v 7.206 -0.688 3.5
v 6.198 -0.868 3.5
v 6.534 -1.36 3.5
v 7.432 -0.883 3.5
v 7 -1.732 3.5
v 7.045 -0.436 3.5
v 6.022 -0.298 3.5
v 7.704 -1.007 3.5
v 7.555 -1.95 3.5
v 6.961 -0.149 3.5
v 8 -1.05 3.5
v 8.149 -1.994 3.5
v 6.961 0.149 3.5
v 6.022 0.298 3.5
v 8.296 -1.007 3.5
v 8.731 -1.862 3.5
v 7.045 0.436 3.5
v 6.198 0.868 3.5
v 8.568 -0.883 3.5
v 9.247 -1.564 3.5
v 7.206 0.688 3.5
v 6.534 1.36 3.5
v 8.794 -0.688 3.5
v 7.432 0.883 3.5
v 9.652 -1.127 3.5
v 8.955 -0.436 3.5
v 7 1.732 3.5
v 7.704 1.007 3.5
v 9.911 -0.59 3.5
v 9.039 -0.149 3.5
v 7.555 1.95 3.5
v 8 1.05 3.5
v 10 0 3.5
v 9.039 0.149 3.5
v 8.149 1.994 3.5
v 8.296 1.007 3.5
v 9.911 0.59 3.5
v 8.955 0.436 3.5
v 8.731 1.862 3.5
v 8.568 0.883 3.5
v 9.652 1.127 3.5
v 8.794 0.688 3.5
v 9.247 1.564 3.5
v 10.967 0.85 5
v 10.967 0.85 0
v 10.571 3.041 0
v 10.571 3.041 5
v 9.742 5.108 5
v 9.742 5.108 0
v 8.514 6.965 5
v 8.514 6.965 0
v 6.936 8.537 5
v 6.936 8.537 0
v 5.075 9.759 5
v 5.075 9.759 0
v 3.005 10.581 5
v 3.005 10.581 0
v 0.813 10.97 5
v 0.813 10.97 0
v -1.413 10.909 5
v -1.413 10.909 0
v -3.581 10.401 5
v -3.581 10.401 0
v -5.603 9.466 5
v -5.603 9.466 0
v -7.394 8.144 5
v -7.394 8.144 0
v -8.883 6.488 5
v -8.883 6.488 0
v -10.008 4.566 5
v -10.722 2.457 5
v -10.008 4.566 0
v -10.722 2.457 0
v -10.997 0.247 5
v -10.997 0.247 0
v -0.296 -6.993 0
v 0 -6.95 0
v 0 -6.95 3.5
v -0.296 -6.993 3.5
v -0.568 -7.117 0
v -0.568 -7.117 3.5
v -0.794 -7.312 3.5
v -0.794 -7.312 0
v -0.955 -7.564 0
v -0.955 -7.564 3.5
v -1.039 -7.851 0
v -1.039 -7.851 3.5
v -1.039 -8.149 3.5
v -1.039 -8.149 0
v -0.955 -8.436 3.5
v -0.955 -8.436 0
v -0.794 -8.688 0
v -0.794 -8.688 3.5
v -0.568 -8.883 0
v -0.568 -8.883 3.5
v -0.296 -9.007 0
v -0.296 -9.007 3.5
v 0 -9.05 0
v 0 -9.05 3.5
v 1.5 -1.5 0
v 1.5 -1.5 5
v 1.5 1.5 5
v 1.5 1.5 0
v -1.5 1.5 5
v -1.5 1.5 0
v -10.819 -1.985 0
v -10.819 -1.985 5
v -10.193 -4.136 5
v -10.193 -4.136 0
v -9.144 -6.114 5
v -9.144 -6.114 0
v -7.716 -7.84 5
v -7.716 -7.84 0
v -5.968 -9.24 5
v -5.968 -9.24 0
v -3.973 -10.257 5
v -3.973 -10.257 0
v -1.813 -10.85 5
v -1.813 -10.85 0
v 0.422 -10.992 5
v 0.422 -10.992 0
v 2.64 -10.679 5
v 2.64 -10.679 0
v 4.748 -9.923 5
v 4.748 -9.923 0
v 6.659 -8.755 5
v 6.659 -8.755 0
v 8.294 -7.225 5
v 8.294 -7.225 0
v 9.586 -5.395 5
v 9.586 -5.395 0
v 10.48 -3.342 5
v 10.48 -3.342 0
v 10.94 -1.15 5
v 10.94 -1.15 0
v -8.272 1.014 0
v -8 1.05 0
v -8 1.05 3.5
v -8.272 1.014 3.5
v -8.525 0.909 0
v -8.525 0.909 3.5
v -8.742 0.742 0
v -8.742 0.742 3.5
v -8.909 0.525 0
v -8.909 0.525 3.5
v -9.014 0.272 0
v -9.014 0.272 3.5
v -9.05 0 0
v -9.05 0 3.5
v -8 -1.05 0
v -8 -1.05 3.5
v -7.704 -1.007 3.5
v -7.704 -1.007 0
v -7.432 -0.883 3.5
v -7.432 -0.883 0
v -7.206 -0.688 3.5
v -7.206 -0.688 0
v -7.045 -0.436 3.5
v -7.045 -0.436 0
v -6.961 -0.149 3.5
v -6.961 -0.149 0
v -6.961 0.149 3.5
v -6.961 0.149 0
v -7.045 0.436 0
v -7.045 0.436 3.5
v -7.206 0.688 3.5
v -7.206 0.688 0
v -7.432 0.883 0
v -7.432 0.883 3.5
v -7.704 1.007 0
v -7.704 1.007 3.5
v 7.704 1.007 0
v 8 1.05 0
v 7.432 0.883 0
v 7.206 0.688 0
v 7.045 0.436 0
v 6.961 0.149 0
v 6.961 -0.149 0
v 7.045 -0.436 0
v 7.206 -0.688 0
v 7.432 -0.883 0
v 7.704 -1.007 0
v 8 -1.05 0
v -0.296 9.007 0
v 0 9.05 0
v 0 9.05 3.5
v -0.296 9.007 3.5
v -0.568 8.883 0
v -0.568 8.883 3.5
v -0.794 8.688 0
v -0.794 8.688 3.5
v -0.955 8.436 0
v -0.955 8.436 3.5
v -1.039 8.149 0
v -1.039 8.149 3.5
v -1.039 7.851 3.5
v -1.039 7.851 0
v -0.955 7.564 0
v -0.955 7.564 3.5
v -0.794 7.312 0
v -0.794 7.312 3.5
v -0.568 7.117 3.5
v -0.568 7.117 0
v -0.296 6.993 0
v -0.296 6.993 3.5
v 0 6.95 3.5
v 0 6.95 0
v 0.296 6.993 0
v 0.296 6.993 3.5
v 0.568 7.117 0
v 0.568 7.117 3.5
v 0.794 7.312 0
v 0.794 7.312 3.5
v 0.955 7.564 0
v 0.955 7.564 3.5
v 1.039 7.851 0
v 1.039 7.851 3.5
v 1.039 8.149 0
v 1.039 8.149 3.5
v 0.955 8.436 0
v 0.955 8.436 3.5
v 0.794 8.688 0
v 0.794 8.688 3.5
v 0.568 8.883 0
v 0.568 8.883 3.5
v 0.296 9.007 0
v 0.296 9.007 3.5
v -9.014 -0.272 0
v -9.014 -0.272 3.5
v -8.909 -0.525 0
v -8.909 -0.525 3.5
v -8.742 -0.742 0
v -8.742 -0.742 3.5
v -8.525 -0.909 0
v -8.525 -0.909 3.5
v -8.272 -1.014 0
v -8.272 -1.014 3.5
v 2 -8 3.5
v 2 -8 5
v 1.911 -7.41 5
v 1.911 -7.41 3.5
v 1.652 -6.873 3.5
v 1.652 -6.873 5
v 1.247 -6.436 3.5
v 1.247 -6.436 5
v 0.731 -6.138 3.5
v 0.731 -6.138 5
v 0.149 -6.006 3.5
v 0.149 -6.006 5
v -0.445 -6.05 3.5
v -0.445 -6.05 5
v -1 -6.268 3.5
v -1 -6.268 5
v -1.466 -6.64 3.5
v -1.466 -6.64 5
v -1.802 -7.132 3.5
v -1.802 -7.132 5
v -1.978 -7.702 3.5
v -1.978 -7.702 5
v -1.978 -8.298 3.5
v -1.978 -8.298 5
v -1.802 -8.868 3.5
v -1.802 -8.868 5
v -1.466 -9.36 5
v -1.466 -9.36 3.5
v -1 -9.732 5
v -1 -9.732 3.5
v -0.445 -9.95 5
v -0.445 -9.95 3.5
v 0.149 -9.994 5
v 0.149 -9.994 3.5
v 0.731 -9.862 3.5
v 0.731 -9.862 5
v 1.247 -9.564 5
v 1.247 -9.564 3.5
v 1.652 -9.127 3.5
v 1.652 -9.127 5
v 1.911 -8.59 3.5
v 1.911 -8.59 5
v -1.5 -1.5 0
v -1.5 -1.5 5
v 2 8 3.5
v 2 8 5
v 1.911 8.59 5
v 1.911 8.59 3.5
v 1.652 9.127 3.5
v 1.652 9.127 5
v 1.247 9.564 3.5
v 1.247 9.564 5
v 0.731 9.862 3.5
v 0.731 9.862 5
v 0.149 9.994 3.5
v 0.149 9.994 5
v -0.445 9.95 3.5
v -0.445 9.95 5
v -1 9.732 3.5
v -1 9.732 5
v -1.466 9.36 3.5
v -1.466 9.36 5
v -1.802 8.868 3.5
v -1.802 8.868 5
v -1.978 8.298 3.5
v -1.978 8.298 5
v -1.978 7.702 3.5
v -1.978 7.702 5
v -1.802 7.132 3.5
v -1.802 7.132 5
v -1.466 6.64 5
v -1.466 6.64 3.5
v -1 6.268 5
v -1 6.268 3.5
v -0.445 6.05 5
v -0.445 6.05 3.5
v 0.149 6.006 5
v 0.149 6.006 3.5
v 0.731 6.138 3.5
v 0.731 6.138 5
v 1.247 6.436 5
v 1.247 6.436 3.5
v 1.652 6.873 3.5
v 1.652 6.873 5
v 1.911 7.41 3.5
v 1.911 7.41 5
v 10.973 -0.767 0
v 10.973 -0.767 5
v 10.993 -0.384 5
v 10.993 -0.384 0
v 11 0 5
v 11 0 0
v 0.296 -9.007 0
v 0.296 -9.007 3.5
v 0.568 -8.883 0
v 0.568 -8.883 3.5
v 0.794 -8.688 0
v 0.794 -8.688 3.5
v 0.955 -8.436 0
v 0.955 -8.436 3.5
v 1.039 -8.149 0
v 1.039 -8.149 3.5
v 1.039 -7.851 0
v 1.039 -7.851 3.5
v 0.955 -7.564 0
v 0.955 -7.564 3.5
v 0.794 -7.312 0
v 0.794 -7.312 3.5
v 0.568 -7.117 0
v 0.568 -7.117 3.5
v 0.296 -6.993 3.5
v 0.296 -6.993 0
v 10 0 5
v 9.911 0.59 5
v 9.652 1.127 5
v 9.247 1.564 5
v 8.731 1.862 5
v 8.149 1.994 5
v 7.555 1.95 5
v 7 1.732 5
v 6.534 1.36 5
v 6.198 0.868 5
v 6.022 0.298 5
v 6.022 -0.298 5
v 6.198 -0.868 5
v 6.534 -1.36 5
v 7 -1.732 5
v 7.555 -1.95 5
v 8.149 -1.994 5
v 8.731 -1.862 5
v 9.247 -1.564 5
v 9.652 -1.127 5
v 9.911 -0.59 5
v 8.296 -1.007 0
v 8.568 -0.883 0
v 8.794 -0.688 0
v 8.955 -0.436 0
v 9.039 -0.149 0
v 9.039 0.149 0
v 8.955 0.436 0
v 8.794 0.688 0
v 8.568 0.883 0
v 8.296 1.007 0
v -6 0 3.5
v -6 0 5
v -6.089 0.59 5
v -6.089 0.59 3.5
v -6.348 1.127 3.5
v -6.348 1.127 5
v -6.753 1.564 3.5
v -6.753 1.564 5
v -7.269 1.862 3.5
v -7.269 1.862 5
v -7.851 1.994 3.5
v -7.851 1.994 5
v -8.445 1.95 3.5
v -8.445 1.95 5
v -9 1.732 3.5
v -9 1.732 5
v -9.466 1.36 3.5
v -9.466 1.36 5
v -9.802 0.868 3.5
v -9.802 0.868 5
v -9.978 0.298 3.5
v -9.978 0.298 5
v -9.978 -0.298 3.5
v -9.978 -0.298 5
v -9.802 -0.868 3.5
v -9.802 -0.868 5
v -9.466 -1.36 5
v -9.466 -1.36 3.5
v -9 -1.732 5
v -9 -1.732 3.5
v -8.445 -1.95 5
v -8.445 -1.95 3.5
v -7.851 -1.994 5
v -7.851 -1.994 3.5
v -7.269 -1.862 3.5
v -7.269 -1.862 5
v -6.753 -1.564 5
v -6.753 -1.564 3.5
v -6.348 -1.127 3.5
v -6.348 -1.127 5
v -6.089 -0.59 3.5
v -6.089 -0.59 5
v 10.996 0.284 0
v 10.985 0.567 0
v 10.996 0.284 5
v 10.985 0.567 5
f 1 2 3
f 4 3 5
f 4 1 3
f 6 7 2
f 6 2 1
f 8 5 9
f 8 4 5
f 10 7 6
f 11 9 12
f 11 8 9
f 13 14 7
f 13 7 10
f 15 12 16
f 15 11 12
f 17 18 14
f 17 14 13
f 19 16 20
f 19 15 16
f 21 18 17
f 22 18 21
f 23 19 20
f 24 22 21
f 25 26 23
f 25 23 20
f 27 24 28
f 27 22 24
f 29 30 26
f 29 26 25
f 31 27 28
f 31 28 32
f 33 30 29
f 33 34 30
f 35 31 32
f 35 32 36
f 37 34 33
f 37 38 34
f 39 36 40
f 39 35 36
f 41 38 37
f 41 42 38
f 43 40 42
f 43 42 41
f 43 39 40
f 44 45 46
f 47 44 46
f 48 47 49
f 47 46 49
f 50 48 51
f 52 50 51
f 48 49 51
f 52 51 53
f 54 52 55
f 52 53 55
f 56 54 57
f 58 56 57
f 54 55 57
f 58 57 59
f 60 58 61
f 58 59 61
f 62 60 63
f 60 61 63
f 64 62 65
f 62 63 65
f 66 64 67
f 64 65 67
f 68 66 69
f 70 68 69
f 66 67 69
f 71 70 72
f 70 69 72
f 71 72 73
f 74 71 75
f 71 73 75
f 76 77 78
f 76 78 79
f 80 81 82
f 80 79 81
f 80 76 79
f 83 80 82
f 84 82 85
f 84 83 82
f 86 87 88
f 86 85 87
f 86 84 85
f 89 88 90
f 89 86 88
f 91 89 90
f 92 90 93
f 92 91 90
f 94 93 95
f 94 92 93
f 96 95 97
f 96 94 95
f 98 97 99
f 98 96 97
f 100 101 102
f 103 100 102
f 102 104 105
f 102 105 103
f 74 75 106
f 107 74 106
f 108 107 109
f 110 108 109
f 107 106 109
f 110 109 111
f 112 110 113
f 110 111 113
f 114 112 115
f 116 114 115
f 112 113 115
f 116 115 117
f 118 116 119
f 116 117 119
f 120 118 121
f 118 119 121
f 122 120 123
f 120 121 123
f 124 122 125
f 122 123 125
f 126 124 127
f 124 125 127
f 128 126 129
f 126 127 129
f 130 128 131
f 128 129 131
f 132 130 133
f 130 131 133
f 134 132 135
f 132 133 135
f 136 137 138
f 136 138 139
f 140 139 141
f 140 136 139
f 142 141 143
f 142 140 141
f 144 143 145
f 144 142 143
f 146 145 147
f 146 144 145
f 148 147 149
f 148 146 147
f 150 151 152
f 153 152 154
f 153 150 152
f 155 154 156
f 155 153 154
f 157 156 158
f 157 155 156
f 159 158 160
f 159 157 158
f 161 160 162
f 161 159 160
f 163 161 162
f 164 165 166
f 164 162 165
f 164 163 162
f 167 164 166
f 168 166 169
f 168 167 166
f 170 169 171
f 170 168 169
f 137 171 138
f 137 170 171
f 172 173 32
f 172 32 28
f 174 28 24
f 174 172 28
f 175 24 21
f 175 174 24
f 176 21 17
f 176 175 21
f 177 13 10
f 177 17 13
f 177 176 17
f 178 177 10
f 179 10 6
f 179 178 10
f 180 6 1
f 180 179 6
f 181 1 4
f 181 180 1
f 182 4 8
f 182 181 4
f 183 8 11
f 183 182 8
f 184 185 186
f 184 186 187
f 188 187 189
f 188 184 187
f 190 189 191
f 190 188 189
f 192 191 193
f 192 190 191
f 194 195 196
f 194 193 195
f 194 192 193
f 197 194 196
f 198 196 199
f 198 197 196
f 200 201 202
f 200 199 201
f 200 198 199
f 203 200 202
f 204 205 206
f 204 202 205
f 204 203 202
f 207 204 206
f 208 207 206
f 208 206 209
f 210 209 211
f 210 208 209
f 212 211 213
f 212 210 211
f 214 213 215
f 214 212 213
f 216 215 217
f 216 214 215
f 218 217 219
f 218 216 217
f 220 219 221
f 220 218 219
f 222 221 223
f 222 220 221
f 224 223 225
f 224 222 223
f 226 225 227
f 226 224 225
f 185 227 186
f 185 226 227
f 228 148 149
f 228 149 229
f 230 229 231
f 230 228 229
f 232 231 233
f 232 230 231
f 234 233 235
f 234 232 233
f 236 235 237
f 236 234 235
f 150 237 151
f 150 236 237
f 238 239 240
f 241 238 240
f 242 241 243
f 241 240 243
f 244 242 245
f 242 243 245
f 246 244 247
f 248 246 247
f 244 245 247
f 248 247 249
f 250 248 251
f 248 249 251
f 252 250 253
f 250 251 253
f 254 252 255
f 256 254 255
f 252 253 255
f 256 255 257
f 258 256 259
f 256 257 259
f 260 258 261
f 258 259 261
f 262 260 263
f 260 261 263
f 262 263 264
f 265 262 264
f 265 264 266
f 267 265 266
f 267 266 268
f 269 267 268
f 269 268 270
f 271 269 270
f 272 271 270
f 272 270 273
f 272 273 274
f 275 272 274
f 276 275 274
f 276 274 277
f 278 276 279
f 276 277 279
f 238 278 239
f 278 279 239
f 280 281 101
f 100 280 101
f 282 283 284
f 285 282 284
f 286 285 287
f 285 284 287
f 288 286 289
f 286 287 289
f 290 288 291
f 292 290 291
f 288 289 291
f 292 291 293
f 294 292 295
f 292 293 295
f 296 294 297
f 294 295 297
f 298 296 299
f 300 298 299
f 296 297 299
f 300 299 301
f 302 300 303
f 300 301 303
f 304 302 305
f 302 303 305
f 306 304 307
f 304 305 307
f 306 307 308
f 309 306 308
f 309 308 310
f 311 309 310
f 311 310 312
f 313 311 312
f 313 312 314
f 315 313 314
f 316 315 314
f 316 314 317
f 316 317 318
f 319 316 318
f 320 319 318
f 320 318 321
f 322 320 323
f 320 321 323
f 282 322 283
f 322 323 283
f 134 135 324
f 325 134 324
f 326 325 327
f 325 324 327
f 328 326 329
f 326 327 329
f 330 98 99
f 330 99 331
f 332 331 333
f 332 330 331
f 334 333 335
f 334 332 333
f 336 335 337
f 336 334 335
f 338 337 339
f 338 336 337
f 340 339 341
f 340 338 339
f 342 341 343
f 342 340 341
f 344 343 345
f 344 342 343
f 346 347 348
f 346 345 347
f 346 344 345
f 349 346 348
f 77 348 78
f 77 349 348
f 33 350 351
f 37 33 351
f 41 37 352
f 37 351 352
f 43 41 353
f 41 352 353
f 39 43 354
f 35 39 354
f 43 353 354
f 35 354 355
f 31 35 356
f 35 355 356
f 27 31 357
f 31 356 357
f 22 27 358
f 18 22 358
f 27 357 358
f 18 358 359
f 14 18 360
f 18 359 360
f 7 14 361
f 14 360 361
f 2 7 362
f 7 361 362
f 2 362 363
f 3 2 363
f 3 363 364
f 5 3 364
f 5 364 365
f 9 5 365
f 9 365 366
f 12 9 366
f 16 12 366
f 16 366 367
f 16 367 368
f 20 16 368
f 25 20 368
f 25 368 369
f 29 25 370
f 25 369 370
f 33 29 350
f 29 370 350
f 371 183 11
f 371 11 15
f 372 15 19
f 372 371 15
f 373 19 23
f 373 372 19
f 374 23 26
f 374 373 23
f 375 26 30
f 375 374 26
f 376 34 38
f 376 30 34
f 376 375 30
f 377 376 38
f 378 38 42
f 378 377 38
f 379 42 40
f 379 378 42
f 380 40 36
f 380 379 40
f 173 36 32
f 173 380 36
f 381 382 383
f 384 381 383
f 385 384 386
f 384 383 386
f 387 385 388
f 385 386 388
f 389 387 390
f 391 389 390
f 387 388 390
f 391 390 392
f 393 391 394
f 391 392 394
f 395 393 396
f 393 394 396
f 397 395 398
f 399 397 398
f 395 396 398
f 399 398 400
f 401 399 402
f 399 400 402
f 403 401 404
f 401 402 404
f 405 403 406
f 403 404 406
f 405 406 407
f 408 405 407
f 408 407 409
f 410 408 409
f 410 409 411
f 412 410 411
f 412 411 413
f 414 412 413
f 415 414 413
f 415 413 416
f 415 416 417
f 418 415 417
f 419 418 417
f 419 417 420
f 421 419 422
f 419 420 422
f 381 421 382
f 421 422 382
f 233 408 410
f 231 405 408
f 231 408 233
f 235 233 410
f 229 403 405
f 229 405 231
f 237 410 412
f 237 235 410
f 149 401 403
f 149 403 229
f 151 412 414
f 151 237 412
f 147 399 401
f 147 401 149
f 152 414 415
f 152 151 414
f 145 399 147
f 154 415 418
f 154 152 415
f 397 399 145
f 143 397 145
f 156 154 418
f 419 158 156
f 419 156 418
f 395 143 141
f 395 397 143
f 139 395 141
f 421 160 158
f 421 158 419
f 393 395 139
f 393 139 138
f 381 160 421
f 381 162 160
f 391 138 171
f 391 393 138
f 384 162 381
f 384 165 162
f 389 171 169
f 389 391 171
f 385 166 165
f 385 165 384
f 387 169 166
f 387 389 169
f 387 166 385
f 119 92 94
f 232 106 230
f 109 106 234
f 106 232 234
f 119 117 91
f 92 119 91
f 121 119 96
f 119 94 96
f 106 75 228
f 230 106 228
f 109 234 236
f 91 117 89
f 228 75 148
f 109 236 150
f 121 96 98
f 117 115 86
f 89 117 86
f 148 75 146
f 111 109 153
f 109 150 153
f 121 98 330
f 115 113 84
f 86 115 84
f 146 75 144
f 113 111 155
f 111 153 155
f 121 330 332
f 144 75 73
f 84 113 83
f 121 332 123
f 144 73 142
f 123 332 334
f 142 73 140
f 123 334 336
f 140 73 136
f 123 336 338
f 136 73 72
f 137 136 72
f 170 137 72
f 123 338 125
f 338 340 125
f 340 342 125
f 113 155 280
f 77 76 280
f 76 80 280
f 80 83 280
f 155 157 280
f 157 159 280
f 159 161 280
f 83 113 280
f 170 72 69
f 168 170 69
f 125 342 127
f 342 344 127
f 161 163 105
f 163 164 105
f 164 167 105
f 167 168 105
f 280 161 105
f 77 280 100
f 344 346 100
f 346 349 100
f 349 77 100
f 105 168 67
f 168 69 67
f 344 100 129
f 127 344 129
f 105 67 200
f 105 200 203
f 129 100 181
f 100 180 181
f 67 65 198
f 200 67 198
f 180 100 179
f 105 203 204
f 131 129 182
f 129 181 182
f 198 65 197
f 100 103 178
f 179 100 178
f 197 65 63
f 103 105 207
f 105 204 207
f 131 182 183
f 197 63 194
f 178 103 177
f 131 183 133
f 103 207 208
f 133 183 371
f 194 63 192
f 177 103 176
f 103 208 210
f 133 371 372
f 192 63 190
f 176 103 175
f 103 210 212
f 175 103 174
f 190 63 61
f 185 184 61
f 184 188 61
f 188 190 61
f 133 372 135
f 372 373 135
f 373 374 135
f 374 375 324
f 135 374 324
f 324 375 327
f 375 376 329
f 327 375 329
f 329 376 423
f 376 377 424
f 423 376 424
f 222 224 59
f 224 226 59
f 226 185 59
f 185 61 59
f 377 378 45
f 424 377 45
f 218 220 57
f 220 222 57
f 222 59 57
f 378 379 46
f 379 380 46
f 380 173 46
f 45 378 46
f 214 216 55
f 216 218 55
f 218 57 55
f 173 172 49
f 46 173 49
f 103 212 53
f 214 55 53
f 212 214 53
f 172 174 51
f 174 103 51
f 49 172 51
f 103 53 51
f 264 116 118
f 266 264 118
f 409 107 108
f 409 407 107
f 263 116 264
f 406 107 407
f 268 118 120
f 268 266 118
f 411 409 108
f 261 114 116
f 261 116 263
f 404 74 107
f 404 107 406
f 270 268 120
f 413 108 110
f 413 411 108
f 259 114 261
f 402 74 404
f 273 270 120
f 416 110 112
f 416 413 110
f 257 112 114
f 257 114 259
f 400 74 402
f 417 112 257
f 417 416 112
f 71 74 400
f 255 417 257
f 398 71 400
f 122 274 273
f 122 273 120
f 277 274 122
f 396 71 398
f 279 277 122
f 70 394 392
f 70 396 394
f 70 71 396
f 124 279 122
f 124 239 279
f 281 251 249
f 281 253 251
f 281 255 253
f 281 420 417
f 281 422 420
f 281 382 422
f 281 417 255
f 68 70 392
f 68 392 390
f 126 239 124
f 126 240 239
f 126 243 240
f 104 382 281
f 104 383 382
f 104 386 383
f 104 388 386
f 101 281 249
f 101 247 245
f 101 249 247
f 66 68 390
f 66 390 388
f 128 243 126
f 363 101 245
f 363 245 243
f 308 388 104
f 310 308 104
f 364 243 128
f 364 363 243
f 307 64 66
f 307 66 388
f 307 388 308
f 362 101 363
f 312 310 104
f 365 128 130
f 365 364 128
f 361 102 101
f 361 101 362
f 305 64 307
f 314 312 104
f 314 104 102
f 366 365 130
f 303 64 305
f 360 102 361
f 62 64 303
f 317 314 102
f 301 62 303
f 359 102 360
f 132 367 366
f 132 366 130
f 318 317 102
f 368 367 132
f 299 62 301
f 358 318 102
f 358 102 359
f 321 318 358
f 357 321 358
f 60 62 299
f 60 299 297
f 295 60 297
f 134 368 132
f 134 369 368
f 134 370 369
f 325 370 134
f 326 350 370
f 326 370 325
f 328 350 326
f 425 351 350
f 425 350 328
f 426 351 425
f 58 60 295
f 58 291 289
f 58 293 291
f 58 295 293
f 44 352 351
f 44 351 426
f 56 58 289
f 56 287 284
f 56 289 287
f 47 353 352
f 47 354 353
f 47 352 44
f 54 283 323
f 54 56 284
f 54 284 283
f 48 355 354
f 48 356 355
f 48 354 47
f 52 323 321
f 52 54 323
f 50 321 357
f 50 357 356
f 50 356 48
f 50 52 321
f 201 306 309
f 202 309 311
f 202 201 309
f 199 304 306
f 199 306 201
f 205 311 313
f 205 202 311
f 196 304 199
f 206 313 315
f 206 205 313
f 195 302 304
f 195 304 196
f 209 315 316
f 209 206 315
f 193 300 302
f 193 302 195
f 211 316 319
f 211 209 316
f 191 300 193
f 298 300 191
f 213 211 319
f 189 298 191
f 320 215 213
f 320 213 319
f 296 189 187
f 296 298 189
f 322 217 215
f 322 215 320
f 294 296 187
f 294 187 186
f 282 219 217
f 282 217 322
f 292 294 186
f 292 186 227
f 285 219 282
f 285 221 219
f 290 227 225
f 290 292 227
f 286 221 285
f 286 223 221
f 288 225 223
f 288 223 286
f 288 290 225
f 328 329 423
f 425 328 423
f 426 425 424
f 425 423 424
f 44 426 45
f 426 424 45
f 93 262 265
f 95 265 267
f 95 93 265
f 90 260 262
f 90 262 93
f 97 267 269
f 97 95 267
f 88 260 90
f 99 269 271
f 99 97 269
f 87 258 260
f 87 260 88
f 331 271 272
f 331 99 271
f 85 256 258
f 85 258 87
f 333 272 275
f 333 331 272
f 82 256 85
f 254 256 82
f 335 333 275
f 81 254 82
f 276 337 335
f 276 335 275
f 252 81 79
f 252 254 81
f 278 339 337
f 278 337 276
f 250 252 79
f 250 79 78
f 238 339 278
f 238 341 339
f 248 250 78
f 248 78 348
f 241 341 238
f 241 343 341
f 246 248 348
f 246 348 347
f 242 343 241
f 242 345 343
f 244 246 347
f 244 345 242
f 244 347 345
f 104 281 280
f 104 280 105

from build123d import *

# Parameters (mm, degrees)
BOSS_EXTRUDE1_DEPTH = 5
SKETCH5_R           = 2
CUT_EXTRUDE1_DEPTH  = 1.5
SKETCH2_W           = 3
SKETCH2_H           = 3
CUT_EXTRUDE2_DEPTH  = 10


with BuildPart() as part:
    # Sketch1 → Boss-Extrude1 (new body)
    with BuildSketch(Plane.XY):
        with BuildLine():
            ThreePointArc((-10.997222353, 0.247207602), (-0.699194891, -10.977755935), (10.939721705, -1.149999502))
            ThreePointArc((10.939721705, -1.149999502), (10.984920466, -0.575788859), (11.000000502, 4.98e-07))
            ThreePointArc((11.000000502, 4.98e-07), (10.991774906, 0.425318543), (10.967110422, 0.850000498))
            ThreePointArc((10.967110422, 0.850000498), (-0.301772264, 10.995860878), (-10.997222353, 0.247207602))
        make_face()
        with BuildLine():
            ThreePointArc((4.98e-07, -9.049999502), (1.050000497, -7.999999502), (4.96e-07, -6.949999502))
            ThreePointArc((4.96e-07, -6.949999502), (-1.049999502, -7.999999503), (4.98e-07, -9.049999502))
        make_face(mode=Mode.SUBTRACT)
        with BuildLine():
            ThreePointArc((8.000000496, 1.050000498), (6.950000497, 4.97e-07), (8.000000498, -1.049999502))
            ThreePointArc((8.000000498, -1.049999502), (9.050000498, 4.98e-07), (8.000000496, 1.050000498))
        make_face(mode=Mode.SUBTRACT)
        with BuildLine():
            ThreePointArc((4.96e-07, 9.050000498), (-1.049999503, 8.000000497), (4.98e-07, 6.950000498))
            ThreePointArc((4.98e-07, 6.950000498), (1.050000498, 8.000000498), (4.96e-07, 9.050000498))
        make_face(mode=Mode.SUBTRACT)
        with BuildLine():
            ThreePointArc((-9.049999498, -9.4808e-05), (-8.742427926, -0.742495317), (-7.999999502, -1.049999502))
            ThreePointArc((-7.999999502, -1.049999502), (-6.949999502, 4.95e-07), (-7.999999497, 1.050000498))
            ThreePointArc((-7.999999497, 1.050000498), (-8.742495315, 0.742428924), (-9.049999498, -9.4808e-05))
        make_face(mode=Mode.SUBTRACT)
    extrude(amount=BOSS_EXTRUDE1_DEPTH)

    # Sketch5 → Cut-Extrude1 (cut)
    with BuildSketch(Plane.XY.offset(5)):
        with Locations((8.000000497, 4.98e-07)):
            Circle(SKETCH5_R)
        with Locations((4.97e-07, -7.999999502)):
            Circle(SKETCH5_R)
        with Locations((-7.999999502, 4.98e-07)):
            Circle(SKETCH5_R)
        with Locations((4.97e-07, 8.000000498)):
            Circle(SKETCH5_R)
    extrude(amount=-CUT_EXTRUDE1_DEPTH, mode=Mode.SUBTRACT)

    # Sketch2 → Cut-Extrude2 (cut)
    with BuildSketch(Plane.XY.offset(5)):
        Rectangle(SKETCH2_W, SKETCH2_H)
    extrude(amount=-CUT_EXTRUDE2_DEPTH, mode=Mode.SUBTRACT)


solid = part.part
